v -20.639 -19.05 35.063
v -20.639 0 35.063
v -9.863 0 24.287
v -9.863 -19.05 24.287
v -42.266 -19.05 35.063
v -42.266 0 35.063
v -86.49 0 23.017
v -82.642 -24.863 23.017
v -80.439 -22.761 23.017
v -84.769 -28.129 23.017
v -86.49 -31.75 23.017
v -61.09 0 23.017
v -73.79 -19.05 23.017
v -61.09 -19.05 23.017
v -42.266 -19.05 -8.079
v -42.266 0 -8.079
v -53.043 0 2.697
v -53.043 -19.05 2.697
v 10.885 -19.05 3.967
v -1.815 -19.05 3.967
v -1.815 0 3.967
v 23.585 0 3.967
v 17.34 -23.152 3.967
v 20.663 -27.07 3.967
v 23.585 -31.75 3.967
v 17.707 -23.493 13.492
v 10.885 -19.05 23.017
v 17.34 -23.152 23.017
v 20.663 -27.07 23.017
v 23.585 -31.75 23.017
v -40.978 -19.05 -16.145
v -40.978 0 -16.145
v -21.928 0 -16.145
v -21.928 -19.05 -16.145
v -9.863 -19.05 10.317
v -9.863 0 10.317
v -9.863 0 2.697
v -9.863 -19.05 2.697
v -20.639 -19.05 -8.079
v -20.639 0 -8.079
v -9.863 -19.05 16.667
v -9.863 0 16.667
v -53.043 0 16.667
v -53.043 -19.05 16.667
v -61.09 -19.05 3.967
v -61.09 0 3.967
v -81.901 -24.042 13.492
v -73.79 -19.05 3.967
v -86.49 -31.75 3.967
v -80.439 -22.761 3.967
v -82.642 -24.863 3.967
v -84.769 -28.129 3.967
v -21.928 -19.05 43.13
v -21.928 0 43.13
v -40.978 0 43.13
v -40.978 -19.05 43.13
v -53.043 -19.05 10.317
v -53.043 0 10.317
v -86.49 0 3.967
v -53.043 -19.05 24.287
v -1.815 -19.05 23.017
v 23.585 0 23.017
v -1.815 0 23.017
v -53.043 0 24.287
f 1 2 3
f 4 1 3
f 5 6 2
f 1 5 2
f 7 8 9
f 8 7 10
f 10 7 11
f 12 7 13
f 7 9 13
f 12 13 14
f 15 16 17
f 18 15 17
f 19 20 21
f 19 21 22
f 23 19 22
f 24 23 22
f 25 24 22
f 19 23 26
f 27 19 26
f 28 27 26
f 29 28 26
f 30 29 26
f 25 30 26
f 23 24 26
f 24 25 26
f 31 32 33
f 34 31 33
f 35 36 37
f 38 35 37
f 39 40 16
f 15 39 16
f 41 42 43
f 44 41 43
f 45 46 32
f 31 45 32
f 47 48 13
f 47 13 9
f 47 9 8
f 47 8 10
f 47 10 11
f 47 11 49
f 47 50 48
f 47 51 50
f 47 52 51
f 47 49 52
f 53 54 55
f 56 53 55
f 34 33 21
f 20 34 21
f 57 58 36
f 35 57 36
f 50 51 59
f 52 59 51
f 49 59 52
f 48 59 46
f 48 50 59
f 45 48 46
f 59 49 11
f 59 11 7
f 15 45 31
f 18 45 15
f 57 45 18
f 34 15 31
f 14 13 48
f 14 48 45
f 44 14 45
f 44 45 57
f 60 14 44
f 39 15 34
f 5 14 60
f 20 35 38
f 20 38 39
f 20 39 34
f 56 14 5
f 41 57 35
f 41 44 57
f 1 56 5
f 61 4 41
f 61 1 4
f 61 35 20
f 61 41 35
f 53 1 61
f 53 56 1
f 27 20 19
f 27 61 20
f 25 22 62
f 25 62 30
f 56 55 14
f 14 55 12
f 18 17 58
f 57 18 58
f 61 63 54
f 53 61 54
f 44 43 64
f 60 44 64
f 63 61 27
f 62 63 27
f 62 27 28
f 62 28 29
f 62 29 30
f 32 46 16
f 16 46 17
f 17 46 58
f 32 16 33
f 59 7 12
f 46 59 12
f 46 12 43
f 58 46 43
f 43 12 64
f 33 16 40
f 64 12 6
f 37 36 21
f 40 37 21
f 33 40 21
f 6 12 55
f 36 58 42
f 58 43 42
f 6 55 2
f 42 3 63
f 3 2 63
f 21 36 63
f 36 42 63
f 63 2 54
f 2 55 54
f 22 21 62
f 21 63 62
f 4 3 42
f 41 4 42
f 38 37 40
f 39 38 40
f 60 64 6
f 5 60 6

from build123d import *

# Parameters (mm, degrees)
F0_W     = 12.7
F0_H     = 19.05
F1_DEPTH = 19.05
F3_DEPTH = 19.05
F5_DEPTH = 19.05


with BuildPart() as f1:
    # F0 (on Front) → F1 (new body)
    with BuildSketch(Plane.XZ):
        Polygon((-21.9277606558, 43.1296415627), (-40.9777606558, 43.1296415627), (-61.0902286349, 23.0171667248), (-73.7902286349, 23.0171667248), (-73.7902286349, 3.9671667248), (-61.0902286349, 3.9671667248), (-40.9777637411, -16.1453046837), (-21.9277637411, -16.1453046837), (-1.8152923326, 3.9671667248), (10.8847076674, 3.9671667248), (10.8847076674, 23.0171667248), (-1.8152923326, 23.0171667248), align=None)
        Polygon((-53.0427621984, 10.3171667248), (-9.8627621984, 10.3171667248), (-9.8627621984, 2.6971667248), (-20.639071289, -8.0791388752), (-42.2664548532, -8.0791406205), (-53.0427621984, 2.6971667248), align=None, mode=Mode.SUBTRACT)
        Polygon((-9.8627621984, 16.6671667248), (-53.0427621984, 16.6671667248), (-53.0427621984, 24.2871667248), (-42.2664531079, 35.0634723248), (-20.6390695437, 35.0634740701), (-9.8627621984, 24.2871667248), align=None, mode=Mode.SUBTRACT)
        with Locations((-80.1402286349, 13.4921667248)):
            Rectangle(F0_W, F0_H)
        with Locations((17.2347076674, 13.4921667248)):
            Rectangle(F0_W, F0_H)
    extrude(amount=F1_DEPTH)

    # F2 (on face) → F3 (join)
    with BuildSketch(Plane(origin=(0, 0, 3.9671667248), x_dir=(1, 0, 0), z_dir=(0, 0, -1))):
        with BuildLine():
            Line((10.8847076674, 19.05), (23.5847076674, 19.05))
            Line((23.5847076674, 19.05), (23.5847076674, 31.75))
            add(Edge.make_bspline(
                [(10.8847076674, 19.05), (13.2814331351, 20.2980463011), (18.3522044059, 22.9385478577), (21.7780861226, 28.7076780967), (23.5847076674, 31.75)],
                knots=[0, 0, 0, 0, 0.4726550143, 1, 1, 1, 1], degree=3))
        make_face()
    extrude(amount=-F3_DEPTH)

    # F4 (on face) → F5 (join)
    with BuildSketch(Plane(origin=(0, 0, 3.9671667248), x_dir=(1, 0, 0), z_dir=(0, 0, -1))):
        with BuildLine():
            Line((-86.4902286349, 31.75), (-86.4902286349, 19.05))
            Line((-86.4902286349, 19.05), (-73.7902286349, 19.05))
            add(Edge.make_bspline(
                [(-73.7902286349, 19.05), (-76.7799525344, 20.4645934924), (-82.6711867803, 23.2520420685), (-85.2299862455, 28.9457660543), (-86.4902286349, 31.75)],
                knots=[0, 0, 0, 0, 0.5074868482, 1, 1, 1, 1], degree=3))
        make_face()
    extrude(amount=-F5_DEPTH)


solid = f1.part
